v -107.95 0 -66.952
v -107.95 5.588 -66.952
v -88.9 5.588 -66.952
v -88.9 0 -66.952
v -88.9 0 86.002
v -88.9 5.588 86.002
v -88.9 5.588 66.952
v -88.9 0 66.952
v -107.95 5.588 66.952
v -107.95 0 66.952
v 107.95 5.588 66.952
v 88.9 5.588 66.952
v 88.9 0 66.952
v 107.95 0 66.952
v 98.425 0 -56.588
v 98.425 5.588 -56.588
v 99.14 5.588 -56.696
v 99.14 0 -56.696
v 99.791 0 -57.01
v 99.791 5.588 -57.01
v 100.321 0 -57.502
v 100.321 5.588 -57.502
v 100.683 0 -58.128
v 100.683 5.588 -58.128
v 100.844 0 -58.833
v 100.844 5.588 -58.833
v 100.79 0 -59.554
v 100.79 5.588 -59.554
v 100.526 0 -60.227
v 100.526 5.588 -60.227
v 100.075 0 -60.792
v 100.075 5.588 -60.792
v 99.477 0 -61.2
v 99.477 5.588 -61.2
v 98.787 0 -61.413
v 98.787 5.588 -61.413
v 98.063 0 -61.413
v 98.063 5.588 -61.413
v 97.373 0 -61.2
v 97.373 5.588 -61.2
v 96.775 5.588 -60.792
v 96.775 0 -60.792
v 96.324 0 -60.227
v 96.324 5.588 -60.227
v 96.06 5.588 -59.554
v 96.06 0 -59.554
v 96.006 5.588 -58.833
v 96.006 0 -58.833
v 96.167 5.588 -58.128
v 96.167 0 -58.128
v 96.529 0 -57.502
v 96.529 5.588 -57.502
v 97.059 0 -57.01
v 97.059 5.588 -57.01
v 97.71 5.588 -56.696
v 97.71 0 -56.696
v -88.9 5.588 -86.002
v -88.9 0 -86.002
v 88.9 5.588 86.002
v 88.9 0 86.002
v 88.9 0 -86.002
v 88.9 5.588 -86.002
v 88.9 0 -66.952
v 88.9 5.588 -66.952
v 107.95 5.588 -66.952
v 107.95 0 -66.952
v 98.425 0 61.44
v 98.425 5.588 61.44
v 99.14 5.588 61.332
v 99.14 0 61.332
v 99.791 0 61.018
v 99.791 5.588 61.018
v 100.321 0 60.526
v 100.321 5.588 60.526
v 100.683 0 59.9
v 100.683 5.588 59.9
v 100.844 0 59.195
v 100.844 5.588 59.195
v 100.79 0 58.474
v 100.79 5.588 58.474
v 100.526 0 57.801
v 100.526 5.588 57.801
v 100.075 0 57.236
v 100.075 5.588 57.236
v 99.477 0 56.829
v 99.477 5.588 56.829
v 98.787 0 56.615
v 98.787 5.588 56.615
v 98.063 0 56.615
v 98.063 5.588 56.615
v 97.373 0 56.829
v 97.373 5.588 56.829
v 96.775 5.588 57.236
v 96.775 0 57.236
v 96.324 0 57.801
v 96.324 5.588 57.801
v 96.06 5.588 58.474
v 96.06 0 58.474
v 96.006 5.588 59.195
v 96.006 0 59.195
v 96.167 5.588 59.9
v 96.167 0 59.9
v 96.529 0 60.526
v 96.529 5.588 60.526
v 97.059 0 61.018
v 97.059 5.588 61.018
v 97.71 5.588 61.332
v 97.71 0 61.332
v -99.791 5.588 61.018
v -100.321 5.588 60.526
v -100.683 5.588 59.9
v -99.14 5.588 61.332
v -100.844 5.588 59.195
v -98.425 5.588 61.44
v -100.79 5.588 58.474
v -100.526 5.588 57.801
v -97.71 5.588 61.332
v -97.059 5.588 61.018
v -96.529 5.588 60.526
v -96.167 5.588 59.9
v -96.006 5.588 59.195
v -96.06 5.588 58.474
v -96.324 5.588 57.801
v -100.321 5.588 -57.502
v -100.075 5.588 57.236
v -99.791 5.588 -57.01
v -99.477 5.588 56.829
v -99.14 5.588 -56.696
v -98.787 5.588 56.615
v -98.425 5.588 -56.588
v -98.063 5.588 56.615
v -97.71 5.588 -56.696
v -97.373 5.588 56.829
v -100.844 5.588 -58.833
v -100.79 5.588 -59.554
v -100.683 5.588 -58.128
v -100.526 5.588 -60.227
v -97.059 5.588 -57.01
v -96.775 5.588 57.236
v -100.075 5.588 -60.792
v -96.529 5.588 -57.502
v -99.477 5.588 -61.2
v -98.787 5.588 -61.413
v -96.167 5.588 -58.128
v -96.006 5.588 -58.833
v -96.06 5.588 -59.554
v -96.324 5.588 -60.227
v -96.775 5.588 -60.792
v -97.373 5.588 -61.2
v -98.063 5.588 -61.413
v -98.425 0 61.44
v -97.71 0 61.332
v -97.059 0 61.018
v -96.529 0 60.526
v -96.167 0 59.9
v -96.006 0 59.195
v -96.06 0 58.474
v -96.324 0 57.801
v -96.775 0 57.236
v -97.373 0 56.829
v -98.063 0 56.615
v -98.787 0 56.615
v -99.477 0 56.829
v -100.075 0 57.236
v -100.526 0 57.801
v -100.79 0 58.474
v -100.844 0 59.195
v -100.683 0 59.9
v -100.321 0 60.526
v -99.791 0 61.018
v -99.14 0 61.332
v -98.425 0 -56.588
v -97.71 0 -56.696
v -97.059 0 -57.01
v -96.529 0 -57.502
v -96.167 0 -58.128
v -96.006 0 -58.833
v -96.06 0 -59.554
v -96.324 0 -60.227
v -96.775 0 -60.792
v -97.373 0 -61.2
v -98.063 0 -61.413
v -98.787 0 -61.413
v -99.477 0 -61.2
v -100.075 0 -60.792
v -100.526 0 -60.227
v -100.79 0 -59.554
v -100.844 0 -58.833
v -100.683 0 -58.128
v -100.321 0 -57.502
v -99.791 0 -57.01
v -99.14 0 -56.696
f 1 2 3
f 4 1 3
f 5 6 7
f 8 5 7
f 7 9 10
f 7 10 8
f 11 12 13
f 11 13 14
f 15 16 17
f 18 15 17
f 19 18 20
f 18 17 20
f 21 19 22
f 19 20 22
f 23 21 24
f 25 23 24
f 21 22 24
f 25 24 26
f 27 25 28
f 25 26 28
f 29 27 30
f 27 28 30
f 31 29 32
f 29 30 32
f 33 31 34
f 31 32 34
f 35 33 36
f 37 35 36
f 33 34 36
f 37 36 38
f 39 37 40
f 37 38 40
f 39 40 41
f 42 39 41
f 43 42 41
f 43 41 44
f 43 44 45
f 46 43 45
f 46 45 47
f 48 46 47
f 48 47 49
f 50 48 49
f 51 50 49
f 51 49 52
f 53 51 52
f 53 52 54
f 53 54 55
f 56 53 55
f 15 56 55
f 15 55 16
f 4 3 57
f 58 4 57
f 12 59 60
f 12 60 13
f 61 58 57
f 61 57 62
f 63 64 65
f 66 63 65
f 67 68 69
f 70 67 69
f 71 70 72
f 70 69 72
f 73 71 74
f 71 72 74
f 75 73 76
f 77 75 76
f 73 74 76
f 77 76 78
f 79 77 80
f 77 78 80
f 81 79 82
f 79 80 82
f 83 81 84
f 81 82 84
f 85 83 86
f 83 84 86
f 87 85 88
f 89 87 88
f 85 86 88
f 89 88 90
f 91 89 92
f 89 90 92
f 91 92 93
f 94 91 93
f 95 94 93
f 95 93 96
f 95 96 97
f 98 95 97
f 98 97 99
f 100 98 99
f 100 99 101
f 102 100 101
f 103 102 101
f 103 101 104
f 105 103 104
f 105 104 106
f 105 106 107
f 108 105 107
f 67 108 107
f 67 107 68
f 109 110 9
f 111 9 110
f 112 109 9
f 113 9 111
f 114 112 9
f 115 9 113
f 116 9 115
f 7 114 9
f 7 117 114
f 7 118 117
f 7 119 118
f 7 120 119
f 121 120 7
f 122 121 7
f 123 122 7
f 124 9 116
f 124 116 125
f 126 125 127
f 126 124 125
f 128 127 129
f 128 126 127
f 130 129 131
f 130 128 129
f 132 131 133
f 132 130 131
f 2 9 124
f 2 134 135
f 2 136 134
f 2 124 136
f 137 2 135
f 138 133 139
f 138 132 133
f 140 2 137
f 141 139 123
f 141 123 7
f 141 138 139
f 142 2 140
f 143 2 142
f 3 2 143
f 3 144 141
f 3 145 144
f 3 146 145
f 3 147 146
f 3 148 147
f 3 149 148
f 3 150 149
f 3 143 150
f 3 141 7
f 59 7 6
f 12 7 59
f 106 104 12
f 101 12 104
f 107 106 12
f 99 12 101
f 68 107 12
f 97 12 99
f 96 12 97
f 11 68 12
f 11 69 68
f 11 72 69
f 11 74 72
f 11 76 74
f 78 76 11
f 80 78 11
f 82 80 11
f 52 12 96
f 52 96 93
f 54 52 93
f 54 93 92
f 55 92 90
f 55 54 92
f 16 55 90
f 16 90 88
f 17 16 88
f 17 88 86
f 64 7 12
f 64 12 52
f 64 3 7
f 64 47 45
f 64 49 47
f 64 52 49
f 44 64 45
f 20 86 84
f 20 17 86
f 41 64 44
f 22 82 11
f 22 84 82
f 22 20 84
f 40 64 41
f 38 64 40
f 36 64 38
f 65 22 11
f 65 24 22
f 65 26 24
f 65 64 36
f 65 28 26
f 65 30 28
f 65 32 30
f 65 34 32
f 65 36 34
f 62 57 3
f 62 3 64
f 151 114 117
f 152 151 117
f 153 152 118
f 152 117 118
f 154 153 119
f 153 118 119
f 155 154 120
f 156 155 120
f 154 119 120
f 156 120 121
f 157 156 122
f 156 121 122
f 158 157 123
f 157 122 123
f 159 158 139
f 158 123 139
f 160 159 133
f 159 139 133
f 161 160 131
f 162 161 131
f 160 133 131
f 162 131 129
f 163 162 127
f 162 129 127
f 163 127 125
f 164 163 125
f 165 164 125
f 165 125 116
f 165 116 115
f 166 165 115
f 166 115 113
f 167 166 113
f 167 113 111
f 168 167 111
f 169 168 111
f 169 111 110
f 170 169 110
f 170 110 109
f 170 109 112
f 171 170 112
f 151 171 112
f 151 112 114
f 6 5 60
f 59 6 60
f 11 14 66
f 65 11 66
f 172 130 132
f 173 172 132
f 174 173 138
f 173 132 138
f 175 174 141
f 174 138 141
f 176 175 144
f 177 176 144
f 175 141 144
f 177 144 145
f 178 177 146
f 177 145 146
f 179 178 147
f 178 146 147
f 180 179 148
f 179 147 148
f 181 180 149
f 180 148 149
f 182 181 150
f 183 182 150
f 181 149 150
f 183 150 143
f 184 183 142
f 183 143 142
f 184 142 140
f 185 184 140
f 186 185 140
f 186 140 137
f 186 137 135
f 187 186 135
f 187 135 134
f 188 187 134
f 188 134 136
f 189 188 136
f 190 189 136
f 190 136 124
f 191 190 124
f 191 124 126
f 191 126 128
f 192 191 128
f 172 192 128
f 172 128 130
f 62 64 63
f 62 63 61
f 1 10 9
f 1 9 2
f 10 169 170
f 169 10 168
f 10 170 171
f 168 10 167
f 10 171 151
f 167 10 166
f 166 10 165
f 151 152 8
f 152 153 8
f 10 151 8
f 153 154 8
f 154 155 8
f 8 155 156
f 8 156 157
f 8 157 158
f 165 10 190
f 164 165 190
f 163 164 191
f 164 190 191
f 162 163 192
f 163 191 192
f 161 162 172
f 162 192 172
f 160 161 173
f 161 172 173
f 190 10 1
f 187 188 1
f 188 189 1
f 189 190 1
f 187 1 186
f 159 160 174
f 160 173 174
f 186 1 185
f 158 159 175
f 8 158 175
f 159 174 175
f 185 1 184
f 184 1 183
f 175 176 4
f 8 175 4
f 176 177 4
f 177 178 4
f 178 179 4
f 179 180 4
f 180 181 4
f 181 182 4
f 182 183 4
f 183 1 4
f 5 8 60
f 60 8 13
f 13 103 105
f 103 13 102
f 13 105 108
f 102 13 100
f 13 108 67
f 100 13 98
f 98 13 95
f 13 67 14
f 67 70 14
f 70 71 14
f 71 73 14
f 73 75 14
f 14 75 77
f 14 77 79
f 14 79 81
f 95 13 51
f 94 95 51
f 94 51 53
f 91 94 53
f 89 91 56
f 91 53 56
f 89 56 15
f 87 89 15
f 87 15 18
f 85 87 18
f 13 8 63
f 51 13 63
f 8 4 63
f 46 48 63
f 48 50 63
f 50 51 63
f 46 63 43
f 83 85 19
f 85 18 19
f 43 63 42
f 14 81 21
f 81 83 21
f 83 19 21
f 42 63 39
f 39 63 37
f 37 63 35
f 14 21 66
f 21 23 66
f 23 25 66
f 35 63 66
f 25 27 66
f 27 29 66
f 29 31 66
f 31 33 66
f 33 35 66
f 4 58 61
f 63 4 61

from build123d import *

# Parameters (mm, degrees)
SKETCH1_W           = 215.9
SKETCH1_H           = 172.003199808
BOSS_EXTRUDE1_DEPTH = 5.588
SKETCH2_W           = 19.05
SKETCH2_H           = 19.05
CORNERCUT_DEPTH     = 139.132919429
SKETCH3_R           = 2.4257
MOUNTHOLES_DEPTH    = 139.132919429


with BuildPart() as part:
    # Sketch1 → Boss-Extrude1 (new body)
    with BuildSketch(Plane(origin=(0, 0, 0), x_dir=(1, 0, 0), z_dir=(0, 1, 0))):
        Rectangle(SKETCH1_W, SKETCH1_H)
    extrude(amount=BOSS_EXTRUDE1_DEPTH)

    # Sketch2 → CornerCut (cut, through all)
    with BuildSketch(Plane(origin=(0, 5.588, 0), x_dir=(1, 0, 0), z_dir=(0, 1, 0))):
        with Locations((-98.425, 76.476599904)):
            Rectangle(SKETCH2_W, SKETCH2_H)
        with Locations((98.425, 76.476599904)):
            Rectangle(SKETCH2_W, SKETCH2_H)
        with Locations((98.425, -76.476599904)):
            Rectangle(SKETCH2_W, SKETCH2_H)
        with Locations((-98.425, -76.476599904)):
            Rectangle(SKETCH2_W, SKETCH2_H)
    extrude(amount=-CORNERCUT_DEPTH, mode=Mode.SUBTRACT)

    # Sketch3 → MountHoles (cut, through all)
    with BuildSketch(Plane(origin=(0, 5.588, 0), x_dir=(1, 0, 0), z_dir=(0, 1, 0))):
        with Locations(Location((-98.425, 59.014099904, 0), (0, 0, 270))):
            Circle(SKETCH3_R)
        with Locations(Location((-98.425, -59.014099904, 0), (0, 0, 270))):
            Circle(SKETCH3_R)
        with Locations(Location((98.425, -59.014099904, 0), (0, 0, 270))):
            Circle(SKETCH3_R)
        with Locations(Location((98.425, 59.014099904, 0), (0, 0, 270))):
            Circle(SKETCH3_R)
    extrude(amount=-MOUNTHOLES_DEPTH, mode=Mode.SUBTRACT)


solid = part.part
